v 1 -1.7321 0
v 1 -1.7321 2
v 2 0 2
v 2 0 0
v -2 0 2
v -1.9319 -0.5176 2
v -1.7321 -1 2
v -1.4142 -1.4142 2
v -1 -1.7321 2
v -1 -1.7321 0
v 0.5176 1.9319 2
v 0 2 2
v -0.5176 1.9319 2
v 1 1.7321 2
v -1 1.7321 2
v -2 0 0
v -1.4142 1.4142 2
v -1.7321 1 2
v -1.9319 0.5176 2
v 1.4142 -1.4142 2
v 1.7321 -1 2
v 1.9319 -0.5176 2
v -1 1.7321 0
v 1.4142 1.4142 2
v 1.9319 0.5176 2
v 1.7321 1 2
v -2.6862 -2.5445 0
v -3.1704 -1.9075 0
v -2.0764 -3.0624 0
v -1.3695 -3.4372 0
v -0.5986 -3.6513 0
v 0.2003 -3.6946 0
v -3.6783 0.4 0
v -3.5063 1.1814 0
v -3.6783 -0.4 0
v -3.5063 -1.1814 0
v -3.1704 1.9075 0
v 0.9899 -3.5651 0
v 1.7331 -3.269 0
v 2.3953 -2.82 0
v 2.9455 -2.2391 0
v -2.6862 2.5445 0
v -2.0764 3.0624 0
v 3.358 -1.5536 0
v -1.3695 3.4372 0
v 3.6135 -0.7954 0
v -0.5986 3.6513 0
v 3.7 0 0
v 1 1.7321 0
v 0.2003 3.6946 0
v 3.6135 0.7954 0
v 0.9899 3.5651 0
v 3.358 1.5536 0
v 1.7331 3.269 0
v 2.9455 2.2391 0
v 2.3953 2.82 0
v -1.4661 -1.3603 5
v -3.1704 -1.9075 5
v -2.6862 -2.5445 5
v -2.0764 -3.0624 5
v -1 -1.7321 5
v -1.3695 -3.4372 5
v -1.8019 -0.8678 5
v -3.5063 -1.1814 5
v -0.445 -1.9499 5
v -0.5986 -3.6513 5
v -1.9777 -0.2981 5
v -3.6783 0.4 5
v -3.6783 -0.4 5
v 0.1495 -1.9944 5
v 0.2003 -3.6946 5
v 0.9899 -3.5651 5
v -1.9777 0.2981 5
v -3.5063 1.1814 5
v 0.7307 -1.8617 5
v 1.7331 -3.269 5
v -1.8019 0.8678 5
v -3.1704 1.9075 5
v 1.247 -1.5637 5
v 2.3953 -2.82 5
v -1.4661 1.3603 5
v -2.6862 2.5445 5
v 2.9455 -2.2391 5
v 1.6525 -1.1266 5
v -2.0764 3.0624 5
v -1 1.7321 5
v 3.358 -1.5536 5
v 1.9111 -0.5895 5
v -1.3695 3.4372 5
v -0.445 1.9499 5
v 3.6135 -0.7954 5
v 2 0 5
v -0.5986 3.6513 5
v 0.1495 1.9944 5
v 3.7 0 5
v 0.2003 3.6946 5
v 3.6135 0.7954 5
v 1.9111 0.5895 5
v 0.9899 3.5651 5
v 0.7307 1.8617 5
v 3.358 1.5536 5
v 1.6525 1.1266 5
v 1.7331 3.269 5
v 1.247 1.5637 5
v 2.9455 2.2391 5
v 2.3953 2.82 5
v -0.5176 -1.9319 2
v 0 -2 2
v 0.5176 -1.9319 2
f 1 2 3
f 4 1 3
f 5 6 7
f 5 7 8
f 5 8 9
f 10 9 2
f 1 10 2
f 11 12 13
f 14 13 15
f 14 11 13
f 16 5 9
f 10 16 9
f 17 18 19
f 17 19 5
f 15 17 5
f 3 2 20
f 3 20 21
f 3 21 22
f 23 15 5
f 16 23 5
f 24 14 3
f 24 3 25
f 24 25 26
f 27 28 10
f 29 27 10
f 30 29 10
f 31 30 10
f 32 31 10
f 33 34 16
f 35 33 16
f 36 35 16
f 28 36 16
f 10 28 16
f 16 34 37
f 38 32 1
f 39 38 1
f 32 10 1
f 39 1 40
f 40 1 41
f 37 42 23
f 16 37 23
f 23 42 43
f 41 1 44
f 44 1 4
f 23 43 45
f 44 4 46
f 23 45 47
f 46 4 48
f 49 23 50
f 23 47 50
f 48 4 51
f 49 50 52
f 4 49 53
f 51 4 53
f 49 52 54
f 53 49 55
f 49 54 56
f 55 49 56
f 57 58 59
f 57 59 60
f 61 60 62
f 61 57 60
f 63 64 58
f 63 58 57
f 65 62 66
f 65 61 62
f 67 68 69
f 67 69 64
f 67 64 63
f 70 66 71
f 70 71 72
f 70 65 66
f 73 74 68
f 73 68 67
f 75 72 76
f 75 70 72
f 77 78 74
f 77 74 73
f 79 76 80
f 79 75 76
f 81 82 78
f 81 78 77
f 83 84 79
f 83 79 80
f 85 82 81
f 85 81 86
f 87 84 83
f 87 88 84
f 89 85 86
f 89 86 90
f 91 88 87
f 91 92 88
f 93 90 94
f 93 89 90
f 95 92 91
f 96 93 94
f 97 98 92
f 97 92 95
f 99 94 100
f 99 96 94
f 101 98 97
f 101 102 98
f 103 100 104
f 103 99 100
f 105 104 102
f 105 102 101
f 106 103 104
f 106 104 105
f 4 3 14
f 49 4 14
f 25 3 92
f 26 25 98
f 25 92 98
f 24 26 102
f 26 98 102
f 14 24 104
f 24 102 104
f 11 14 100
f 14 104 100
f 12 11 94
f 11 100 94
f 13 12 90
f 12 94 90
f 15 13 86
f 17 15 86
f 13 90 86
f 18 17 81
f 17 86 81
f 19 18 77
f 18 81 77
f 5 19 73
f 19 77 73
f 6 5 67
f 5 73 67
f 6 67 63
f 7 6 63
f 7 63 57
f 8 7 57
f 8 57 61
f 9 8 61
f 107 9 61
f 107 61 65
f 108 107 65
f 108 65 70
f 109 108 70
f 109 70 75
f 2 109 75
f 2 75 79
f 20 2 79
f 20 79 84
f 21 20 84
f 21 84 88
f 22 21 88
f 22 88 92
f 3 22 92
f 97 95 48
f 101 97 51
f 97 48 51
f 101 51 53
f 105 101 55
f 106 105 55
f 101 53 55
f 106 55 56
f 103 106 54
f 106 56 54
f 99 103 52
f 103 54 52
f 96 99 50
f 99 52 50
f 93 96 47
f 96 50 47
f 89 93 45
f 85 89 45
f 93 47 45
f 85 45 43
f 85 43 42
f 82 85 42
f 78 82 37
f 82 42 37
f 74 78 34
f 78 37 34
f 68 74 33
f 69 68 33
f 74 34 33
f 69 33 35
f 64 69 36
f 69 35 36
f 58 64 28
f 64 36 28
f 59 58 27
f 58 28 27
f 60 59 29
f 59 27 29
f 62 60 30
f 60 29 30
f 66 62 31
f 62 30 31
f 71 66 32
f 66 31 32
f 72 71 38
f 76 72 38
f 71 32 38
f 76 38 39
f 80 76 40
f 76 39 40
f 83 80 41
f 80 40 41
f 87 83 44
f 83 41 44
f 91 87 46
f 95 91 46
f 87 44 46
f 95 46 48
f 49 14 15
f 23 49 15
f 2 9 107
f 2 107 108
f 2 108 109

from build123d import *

# Parameters (mm, degrees)
SKETCH_1_R          = 3.7
EXTRUDE_1_DEPTH     = 5
SKETCH_2_R          = 2
CUT_EXTRUDE_1_DEPTH = 3
CUT_EXTRUDE_2_DEPTH = 4


with BuildPart() as part:
    # 草图1 → 凸台-拉伸1 (new body)
    with BuildSketch(Plane.XY):
        Circle(SKETCH_1_R)
    extrude(amount=EXTRUDE_1_DEPTH)

    # 草图2 → 切除-拉伸1 (cut)
    with BuildSketch(Plane.XY.offset(5)):
        Circle(SKETCH_2_R)
    extrude(amount=-CUT_EXTRUDE_1_DEPTH, mode=Mode.SUBTRACT)

    # 草图3 → 切除-拉伸2 (cut)
    with BuildSketch(Plane.XY.offset(2)):
        Polygon((1, -1.732050808), (2, 0), (1, 1.732050808), (-1, 1.732050808), (-2, 0), (-1, -1.732050808), align=None)
    extrude(amount=-CUT_EXTRUDE_2_DEPTH, mode=Mode.SUBTRACT)


solid = part.part
